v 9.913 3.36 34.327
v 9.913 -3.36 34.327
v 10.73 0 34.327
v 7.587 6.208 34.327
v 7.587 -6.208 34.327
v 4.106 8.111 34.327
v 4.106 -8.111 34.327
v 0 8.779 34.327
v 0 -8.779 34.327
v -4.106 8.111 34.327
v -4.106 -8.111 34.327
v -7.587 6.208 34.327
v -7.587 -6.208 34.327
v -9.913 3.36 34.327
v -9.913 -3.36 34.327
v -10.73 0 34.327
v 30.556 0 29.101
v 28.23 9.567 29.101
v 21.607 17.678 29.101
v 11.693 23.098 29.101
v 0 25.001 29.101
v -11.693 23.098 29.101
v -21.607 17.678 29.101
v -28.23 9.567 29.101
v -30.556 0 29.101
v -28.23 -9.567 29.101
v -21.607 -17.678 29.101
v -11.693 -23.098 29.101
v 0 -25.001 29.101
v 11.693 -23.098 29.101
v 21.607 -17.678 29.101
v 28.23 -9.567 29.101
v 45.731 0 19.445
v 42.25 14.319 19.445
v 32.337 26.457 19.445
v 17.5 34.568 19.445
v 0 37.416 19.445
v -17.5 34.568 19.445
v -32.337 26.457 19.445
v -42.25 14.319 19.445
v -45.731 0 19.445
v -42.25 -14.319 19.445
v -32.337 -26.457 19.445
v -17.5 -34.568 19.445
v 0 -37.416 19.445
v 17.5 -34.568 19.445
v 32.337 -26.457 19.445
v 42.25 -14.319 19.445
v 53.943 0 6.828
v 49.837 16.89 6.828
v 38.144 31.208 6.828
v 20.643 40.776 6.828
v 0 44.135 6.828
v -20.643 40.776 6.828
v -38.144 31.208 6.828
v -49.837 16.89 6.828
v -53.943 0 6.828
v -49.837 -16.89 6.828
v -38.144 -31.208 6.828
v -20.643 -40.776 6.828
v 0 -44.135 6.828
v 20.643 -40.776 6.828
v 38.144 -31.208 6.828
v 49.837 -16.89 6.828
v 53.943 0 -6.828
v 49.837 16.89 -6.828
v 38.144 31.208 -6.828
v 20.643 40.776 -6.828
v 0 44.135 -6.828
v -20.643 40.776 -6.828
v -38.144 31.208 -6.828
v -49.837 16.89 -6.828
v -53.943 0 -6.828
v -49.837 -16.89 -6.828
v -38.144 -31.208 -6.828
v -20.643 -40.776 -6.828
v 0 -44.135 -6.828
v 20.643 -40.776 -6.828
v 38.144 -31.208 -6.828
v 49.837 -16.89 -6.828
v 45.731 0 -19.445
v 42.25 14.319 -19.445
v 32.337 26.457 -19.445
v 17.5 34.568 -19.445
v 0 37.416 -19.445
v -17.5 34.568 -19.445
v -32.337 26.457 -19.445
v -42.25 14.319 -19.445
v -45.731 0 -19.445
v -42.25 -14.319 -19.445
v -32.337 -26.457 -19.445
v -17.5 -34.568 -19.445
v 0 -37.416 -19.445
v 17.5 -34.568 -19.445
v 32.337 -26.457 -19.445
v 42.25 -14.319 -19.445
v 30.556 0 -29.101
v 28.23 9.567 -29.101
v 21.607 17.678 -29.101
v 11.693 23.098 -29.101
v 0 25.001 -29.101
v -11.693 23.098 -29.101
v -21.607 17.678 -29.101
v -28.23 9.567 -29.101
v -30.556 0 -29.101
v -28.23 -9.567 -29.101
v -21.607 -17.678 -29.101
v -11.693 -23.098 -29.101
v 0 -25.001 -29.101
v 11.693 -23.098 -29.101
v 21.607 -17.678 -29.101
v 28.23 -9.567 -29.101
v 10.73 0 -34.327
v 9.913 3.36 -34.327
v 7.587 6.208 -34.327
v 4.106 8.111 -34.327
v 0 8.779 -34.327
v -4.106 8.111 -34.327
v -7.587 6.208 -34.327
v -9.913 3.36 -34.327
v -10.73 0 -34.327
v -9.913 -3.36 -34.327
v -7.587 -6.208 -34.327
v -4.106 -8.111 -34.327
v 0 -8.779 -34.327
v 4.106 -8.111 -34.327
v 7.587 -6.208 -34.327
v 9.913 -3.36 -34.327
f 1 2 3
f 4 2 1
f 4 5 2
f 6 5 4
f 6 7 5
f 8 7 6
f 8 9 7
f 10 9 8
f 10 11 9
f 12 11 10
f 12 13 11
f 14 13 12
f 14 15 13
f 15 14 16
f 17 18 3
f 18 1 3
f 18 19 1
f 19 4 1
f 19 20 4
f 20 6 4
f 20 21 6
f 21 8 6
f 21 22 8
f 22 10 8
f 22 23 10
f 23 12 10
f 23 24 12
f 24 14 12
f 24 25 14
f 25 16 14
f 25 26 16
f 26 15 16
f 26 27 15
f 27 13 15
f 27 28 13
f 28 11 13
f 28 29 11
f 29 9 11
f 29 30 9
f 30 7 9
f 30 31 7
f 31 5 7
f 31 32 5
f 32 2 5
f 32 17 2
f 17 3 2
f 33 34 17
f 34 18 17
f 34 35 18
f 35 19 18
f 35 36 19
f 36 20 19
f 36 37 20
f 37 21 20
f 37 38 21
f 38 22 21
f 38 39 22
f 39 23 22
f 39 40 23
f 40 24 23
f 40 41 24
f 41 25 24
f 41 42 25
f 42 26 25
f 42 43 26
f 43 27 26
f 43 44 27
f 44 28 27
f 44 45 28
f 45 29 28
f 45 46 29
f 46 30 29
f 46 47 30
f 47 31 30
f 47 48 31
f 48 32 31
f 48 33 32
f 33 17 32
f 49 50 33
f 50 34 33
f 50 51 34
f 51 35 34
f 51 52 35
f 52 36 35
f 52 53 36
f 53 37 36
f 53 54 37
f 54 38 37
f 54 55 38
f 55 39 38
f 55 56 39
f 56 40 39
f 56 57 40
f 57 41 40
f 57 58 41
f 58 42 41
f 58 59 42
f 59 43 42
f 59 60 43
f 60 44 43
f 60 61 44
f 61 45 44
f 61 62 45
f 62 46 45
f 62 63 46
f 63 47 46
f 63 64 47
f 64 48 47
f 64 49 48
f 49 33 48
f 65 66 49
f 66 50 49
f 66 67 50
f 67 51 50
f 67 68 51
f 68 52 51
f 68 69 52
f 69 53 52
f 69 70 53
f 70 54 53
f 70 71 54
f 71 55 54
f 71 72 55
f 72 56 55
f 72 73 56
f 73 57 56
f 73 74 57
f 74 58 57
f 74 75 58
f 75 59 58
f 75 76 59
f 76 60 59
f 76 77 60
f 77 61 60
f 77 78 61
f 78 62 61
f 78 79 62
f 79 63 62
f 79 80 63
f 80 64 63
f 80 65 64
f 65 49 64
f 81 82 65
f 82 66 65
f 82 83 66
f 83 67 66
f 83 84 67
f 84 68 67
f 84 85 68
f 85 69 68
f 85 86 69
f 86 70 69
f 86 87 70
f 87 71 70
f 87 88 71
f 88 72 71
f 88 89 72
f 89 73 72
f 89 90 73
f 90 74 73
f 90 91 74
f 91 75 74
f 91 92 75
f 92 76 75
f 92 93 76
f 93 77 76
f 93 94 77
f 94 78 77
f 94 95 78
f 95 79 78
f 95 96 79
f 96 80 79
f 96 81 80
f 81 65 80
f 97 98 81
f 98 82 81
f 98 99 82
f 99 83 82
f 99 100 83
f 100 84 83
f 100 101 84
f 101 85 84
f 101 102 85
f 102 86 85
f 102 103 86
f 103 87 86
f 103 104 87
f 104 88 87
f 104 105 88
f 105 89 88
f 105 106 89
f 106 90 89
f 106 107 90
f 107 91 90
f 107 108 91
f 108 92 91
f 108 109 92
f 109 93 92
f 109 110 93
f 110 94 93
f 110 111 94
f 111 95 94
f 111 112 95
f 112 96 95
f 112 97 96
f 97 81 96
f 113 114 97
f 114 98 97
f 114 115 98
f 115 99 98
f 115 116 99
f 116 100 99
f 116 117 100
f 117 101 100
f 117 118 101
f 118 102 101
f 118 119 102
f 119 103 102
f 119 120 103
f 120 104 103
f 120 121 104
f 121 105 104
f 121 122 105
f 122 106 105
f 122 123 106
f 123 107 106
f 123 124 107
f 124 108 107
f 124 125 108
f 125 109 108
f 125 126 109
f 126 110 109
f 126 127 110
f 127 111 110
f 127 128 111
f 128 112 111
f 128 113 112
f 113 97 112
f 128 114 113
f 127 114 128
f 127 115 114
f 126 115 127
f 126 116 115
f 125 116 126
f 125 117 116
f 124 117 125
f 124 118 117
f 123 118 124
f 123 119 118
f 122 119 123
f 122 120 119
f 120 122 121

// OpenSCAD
// Generated by SolidPython 1.0.1 on 2020-07-29 00:46:49


scale(v = [11, 9, 7]) {
	sphere(r = 5);
}
/***********************************************
*********      SolidPython code:      **********
************************************************
 
# import packages: SolidPython
from solid import *
from solid.utils import *
from itertools import chain, combinations, permutations


class Resize:

    def __init__(self, scad_file):
        self.scad_file = scad_file
        #self.scad_file = import_scad(scad_file)
        # cone/cylinder param:
        self.r1 = 0
        self.r2 = 0
        self.h = 0
        # rectangular prism param:
        self.w = 0
        self.l = 0
        # ellipse param:
        self.r = 0

    # import OpenScad code (file name corresponds to shape)


    # classify shape + parameters
    def assign(self, param1, param2, param3):
        if self.scad_file == 'cone.scad':
            self.r1 = param1
            self.r2 = param2
            self.h = param3
        elif self.scad_file == 'cylinder.scad':
            self.r1 = param1
            self.r2 = param2
            self.h = param3
        elif self.scad_file == 'rectangularPrism.scad':
            self.h = param1
            self.l = param2
            self.w = param3
        else:
            self.r = param1
            self.h = param2

    # resize parameters
    def iterate(self):
        x = range(3, 20, 2)
        i = 1
        if self.scad_file == 'cone.scad':
            tempList = list(permutations(x, 2))
            for temp in tempList:
                param1 = temp[0]
                param2 = temp[1]
                filepath = 'produced_scad_files/' + 'cone' + str(param1) + '_' + str(param2) + '_' + '.scad'
                scad_render_to_file(cylinder(h=param1, r1=param2, r2=0), filepath)

        elif self.scad_file == 'cylinder.scad':
            tempList = list(permutations(x, 3))
            for temp in tempList:
                param1 = temp[0]
                param2 = temp[1]
                filepath = 'produced_scad_files/' + 'cylinder' + str(param1) + '_' + str(param2) + '_' + '.scad'
                scad_render_to_file(cylinder(h=param1, r1=param2, r2=param2), filepath)

        elif self.scad_file == 'rectangularPrism.scad':
            tempList = list(permutations(x, 3))
            for temp in tempList:
                param1 = temp[0]
                param2 = temp[1]
                param3 = temp[2]
                filepath = 'produced_scad_files/' + 'rectangularPrism' + str(param1) + '_' + str(param2) + '_' + str(
                    param3) + '.scad'
                scad_render_to_file(cube(size=(param1, param2, param3)), filepath)

        elif self.scad_file == 'ellipse.scad':
            tempList = list(permutations(x, 4))
            for temp in tempList:
                param1 = temp[0]
                param2 = temp[1]
                param3 = temp[2]
                param4 = temp[3]
                filepath = 'produced_scad_files/' + 'ellipse' + str(param1) + '_' + str(param2) + '_' + str(param3) + '_' + str(param4) + '.scad'
                scad_render_to_file(scale([param1, param2, param3])(sphere(r=param4)), filepath)

    def render_to_scadfile(self):
        scad_render_to_file(scad, 'example.scad') 
 
************************************************/
